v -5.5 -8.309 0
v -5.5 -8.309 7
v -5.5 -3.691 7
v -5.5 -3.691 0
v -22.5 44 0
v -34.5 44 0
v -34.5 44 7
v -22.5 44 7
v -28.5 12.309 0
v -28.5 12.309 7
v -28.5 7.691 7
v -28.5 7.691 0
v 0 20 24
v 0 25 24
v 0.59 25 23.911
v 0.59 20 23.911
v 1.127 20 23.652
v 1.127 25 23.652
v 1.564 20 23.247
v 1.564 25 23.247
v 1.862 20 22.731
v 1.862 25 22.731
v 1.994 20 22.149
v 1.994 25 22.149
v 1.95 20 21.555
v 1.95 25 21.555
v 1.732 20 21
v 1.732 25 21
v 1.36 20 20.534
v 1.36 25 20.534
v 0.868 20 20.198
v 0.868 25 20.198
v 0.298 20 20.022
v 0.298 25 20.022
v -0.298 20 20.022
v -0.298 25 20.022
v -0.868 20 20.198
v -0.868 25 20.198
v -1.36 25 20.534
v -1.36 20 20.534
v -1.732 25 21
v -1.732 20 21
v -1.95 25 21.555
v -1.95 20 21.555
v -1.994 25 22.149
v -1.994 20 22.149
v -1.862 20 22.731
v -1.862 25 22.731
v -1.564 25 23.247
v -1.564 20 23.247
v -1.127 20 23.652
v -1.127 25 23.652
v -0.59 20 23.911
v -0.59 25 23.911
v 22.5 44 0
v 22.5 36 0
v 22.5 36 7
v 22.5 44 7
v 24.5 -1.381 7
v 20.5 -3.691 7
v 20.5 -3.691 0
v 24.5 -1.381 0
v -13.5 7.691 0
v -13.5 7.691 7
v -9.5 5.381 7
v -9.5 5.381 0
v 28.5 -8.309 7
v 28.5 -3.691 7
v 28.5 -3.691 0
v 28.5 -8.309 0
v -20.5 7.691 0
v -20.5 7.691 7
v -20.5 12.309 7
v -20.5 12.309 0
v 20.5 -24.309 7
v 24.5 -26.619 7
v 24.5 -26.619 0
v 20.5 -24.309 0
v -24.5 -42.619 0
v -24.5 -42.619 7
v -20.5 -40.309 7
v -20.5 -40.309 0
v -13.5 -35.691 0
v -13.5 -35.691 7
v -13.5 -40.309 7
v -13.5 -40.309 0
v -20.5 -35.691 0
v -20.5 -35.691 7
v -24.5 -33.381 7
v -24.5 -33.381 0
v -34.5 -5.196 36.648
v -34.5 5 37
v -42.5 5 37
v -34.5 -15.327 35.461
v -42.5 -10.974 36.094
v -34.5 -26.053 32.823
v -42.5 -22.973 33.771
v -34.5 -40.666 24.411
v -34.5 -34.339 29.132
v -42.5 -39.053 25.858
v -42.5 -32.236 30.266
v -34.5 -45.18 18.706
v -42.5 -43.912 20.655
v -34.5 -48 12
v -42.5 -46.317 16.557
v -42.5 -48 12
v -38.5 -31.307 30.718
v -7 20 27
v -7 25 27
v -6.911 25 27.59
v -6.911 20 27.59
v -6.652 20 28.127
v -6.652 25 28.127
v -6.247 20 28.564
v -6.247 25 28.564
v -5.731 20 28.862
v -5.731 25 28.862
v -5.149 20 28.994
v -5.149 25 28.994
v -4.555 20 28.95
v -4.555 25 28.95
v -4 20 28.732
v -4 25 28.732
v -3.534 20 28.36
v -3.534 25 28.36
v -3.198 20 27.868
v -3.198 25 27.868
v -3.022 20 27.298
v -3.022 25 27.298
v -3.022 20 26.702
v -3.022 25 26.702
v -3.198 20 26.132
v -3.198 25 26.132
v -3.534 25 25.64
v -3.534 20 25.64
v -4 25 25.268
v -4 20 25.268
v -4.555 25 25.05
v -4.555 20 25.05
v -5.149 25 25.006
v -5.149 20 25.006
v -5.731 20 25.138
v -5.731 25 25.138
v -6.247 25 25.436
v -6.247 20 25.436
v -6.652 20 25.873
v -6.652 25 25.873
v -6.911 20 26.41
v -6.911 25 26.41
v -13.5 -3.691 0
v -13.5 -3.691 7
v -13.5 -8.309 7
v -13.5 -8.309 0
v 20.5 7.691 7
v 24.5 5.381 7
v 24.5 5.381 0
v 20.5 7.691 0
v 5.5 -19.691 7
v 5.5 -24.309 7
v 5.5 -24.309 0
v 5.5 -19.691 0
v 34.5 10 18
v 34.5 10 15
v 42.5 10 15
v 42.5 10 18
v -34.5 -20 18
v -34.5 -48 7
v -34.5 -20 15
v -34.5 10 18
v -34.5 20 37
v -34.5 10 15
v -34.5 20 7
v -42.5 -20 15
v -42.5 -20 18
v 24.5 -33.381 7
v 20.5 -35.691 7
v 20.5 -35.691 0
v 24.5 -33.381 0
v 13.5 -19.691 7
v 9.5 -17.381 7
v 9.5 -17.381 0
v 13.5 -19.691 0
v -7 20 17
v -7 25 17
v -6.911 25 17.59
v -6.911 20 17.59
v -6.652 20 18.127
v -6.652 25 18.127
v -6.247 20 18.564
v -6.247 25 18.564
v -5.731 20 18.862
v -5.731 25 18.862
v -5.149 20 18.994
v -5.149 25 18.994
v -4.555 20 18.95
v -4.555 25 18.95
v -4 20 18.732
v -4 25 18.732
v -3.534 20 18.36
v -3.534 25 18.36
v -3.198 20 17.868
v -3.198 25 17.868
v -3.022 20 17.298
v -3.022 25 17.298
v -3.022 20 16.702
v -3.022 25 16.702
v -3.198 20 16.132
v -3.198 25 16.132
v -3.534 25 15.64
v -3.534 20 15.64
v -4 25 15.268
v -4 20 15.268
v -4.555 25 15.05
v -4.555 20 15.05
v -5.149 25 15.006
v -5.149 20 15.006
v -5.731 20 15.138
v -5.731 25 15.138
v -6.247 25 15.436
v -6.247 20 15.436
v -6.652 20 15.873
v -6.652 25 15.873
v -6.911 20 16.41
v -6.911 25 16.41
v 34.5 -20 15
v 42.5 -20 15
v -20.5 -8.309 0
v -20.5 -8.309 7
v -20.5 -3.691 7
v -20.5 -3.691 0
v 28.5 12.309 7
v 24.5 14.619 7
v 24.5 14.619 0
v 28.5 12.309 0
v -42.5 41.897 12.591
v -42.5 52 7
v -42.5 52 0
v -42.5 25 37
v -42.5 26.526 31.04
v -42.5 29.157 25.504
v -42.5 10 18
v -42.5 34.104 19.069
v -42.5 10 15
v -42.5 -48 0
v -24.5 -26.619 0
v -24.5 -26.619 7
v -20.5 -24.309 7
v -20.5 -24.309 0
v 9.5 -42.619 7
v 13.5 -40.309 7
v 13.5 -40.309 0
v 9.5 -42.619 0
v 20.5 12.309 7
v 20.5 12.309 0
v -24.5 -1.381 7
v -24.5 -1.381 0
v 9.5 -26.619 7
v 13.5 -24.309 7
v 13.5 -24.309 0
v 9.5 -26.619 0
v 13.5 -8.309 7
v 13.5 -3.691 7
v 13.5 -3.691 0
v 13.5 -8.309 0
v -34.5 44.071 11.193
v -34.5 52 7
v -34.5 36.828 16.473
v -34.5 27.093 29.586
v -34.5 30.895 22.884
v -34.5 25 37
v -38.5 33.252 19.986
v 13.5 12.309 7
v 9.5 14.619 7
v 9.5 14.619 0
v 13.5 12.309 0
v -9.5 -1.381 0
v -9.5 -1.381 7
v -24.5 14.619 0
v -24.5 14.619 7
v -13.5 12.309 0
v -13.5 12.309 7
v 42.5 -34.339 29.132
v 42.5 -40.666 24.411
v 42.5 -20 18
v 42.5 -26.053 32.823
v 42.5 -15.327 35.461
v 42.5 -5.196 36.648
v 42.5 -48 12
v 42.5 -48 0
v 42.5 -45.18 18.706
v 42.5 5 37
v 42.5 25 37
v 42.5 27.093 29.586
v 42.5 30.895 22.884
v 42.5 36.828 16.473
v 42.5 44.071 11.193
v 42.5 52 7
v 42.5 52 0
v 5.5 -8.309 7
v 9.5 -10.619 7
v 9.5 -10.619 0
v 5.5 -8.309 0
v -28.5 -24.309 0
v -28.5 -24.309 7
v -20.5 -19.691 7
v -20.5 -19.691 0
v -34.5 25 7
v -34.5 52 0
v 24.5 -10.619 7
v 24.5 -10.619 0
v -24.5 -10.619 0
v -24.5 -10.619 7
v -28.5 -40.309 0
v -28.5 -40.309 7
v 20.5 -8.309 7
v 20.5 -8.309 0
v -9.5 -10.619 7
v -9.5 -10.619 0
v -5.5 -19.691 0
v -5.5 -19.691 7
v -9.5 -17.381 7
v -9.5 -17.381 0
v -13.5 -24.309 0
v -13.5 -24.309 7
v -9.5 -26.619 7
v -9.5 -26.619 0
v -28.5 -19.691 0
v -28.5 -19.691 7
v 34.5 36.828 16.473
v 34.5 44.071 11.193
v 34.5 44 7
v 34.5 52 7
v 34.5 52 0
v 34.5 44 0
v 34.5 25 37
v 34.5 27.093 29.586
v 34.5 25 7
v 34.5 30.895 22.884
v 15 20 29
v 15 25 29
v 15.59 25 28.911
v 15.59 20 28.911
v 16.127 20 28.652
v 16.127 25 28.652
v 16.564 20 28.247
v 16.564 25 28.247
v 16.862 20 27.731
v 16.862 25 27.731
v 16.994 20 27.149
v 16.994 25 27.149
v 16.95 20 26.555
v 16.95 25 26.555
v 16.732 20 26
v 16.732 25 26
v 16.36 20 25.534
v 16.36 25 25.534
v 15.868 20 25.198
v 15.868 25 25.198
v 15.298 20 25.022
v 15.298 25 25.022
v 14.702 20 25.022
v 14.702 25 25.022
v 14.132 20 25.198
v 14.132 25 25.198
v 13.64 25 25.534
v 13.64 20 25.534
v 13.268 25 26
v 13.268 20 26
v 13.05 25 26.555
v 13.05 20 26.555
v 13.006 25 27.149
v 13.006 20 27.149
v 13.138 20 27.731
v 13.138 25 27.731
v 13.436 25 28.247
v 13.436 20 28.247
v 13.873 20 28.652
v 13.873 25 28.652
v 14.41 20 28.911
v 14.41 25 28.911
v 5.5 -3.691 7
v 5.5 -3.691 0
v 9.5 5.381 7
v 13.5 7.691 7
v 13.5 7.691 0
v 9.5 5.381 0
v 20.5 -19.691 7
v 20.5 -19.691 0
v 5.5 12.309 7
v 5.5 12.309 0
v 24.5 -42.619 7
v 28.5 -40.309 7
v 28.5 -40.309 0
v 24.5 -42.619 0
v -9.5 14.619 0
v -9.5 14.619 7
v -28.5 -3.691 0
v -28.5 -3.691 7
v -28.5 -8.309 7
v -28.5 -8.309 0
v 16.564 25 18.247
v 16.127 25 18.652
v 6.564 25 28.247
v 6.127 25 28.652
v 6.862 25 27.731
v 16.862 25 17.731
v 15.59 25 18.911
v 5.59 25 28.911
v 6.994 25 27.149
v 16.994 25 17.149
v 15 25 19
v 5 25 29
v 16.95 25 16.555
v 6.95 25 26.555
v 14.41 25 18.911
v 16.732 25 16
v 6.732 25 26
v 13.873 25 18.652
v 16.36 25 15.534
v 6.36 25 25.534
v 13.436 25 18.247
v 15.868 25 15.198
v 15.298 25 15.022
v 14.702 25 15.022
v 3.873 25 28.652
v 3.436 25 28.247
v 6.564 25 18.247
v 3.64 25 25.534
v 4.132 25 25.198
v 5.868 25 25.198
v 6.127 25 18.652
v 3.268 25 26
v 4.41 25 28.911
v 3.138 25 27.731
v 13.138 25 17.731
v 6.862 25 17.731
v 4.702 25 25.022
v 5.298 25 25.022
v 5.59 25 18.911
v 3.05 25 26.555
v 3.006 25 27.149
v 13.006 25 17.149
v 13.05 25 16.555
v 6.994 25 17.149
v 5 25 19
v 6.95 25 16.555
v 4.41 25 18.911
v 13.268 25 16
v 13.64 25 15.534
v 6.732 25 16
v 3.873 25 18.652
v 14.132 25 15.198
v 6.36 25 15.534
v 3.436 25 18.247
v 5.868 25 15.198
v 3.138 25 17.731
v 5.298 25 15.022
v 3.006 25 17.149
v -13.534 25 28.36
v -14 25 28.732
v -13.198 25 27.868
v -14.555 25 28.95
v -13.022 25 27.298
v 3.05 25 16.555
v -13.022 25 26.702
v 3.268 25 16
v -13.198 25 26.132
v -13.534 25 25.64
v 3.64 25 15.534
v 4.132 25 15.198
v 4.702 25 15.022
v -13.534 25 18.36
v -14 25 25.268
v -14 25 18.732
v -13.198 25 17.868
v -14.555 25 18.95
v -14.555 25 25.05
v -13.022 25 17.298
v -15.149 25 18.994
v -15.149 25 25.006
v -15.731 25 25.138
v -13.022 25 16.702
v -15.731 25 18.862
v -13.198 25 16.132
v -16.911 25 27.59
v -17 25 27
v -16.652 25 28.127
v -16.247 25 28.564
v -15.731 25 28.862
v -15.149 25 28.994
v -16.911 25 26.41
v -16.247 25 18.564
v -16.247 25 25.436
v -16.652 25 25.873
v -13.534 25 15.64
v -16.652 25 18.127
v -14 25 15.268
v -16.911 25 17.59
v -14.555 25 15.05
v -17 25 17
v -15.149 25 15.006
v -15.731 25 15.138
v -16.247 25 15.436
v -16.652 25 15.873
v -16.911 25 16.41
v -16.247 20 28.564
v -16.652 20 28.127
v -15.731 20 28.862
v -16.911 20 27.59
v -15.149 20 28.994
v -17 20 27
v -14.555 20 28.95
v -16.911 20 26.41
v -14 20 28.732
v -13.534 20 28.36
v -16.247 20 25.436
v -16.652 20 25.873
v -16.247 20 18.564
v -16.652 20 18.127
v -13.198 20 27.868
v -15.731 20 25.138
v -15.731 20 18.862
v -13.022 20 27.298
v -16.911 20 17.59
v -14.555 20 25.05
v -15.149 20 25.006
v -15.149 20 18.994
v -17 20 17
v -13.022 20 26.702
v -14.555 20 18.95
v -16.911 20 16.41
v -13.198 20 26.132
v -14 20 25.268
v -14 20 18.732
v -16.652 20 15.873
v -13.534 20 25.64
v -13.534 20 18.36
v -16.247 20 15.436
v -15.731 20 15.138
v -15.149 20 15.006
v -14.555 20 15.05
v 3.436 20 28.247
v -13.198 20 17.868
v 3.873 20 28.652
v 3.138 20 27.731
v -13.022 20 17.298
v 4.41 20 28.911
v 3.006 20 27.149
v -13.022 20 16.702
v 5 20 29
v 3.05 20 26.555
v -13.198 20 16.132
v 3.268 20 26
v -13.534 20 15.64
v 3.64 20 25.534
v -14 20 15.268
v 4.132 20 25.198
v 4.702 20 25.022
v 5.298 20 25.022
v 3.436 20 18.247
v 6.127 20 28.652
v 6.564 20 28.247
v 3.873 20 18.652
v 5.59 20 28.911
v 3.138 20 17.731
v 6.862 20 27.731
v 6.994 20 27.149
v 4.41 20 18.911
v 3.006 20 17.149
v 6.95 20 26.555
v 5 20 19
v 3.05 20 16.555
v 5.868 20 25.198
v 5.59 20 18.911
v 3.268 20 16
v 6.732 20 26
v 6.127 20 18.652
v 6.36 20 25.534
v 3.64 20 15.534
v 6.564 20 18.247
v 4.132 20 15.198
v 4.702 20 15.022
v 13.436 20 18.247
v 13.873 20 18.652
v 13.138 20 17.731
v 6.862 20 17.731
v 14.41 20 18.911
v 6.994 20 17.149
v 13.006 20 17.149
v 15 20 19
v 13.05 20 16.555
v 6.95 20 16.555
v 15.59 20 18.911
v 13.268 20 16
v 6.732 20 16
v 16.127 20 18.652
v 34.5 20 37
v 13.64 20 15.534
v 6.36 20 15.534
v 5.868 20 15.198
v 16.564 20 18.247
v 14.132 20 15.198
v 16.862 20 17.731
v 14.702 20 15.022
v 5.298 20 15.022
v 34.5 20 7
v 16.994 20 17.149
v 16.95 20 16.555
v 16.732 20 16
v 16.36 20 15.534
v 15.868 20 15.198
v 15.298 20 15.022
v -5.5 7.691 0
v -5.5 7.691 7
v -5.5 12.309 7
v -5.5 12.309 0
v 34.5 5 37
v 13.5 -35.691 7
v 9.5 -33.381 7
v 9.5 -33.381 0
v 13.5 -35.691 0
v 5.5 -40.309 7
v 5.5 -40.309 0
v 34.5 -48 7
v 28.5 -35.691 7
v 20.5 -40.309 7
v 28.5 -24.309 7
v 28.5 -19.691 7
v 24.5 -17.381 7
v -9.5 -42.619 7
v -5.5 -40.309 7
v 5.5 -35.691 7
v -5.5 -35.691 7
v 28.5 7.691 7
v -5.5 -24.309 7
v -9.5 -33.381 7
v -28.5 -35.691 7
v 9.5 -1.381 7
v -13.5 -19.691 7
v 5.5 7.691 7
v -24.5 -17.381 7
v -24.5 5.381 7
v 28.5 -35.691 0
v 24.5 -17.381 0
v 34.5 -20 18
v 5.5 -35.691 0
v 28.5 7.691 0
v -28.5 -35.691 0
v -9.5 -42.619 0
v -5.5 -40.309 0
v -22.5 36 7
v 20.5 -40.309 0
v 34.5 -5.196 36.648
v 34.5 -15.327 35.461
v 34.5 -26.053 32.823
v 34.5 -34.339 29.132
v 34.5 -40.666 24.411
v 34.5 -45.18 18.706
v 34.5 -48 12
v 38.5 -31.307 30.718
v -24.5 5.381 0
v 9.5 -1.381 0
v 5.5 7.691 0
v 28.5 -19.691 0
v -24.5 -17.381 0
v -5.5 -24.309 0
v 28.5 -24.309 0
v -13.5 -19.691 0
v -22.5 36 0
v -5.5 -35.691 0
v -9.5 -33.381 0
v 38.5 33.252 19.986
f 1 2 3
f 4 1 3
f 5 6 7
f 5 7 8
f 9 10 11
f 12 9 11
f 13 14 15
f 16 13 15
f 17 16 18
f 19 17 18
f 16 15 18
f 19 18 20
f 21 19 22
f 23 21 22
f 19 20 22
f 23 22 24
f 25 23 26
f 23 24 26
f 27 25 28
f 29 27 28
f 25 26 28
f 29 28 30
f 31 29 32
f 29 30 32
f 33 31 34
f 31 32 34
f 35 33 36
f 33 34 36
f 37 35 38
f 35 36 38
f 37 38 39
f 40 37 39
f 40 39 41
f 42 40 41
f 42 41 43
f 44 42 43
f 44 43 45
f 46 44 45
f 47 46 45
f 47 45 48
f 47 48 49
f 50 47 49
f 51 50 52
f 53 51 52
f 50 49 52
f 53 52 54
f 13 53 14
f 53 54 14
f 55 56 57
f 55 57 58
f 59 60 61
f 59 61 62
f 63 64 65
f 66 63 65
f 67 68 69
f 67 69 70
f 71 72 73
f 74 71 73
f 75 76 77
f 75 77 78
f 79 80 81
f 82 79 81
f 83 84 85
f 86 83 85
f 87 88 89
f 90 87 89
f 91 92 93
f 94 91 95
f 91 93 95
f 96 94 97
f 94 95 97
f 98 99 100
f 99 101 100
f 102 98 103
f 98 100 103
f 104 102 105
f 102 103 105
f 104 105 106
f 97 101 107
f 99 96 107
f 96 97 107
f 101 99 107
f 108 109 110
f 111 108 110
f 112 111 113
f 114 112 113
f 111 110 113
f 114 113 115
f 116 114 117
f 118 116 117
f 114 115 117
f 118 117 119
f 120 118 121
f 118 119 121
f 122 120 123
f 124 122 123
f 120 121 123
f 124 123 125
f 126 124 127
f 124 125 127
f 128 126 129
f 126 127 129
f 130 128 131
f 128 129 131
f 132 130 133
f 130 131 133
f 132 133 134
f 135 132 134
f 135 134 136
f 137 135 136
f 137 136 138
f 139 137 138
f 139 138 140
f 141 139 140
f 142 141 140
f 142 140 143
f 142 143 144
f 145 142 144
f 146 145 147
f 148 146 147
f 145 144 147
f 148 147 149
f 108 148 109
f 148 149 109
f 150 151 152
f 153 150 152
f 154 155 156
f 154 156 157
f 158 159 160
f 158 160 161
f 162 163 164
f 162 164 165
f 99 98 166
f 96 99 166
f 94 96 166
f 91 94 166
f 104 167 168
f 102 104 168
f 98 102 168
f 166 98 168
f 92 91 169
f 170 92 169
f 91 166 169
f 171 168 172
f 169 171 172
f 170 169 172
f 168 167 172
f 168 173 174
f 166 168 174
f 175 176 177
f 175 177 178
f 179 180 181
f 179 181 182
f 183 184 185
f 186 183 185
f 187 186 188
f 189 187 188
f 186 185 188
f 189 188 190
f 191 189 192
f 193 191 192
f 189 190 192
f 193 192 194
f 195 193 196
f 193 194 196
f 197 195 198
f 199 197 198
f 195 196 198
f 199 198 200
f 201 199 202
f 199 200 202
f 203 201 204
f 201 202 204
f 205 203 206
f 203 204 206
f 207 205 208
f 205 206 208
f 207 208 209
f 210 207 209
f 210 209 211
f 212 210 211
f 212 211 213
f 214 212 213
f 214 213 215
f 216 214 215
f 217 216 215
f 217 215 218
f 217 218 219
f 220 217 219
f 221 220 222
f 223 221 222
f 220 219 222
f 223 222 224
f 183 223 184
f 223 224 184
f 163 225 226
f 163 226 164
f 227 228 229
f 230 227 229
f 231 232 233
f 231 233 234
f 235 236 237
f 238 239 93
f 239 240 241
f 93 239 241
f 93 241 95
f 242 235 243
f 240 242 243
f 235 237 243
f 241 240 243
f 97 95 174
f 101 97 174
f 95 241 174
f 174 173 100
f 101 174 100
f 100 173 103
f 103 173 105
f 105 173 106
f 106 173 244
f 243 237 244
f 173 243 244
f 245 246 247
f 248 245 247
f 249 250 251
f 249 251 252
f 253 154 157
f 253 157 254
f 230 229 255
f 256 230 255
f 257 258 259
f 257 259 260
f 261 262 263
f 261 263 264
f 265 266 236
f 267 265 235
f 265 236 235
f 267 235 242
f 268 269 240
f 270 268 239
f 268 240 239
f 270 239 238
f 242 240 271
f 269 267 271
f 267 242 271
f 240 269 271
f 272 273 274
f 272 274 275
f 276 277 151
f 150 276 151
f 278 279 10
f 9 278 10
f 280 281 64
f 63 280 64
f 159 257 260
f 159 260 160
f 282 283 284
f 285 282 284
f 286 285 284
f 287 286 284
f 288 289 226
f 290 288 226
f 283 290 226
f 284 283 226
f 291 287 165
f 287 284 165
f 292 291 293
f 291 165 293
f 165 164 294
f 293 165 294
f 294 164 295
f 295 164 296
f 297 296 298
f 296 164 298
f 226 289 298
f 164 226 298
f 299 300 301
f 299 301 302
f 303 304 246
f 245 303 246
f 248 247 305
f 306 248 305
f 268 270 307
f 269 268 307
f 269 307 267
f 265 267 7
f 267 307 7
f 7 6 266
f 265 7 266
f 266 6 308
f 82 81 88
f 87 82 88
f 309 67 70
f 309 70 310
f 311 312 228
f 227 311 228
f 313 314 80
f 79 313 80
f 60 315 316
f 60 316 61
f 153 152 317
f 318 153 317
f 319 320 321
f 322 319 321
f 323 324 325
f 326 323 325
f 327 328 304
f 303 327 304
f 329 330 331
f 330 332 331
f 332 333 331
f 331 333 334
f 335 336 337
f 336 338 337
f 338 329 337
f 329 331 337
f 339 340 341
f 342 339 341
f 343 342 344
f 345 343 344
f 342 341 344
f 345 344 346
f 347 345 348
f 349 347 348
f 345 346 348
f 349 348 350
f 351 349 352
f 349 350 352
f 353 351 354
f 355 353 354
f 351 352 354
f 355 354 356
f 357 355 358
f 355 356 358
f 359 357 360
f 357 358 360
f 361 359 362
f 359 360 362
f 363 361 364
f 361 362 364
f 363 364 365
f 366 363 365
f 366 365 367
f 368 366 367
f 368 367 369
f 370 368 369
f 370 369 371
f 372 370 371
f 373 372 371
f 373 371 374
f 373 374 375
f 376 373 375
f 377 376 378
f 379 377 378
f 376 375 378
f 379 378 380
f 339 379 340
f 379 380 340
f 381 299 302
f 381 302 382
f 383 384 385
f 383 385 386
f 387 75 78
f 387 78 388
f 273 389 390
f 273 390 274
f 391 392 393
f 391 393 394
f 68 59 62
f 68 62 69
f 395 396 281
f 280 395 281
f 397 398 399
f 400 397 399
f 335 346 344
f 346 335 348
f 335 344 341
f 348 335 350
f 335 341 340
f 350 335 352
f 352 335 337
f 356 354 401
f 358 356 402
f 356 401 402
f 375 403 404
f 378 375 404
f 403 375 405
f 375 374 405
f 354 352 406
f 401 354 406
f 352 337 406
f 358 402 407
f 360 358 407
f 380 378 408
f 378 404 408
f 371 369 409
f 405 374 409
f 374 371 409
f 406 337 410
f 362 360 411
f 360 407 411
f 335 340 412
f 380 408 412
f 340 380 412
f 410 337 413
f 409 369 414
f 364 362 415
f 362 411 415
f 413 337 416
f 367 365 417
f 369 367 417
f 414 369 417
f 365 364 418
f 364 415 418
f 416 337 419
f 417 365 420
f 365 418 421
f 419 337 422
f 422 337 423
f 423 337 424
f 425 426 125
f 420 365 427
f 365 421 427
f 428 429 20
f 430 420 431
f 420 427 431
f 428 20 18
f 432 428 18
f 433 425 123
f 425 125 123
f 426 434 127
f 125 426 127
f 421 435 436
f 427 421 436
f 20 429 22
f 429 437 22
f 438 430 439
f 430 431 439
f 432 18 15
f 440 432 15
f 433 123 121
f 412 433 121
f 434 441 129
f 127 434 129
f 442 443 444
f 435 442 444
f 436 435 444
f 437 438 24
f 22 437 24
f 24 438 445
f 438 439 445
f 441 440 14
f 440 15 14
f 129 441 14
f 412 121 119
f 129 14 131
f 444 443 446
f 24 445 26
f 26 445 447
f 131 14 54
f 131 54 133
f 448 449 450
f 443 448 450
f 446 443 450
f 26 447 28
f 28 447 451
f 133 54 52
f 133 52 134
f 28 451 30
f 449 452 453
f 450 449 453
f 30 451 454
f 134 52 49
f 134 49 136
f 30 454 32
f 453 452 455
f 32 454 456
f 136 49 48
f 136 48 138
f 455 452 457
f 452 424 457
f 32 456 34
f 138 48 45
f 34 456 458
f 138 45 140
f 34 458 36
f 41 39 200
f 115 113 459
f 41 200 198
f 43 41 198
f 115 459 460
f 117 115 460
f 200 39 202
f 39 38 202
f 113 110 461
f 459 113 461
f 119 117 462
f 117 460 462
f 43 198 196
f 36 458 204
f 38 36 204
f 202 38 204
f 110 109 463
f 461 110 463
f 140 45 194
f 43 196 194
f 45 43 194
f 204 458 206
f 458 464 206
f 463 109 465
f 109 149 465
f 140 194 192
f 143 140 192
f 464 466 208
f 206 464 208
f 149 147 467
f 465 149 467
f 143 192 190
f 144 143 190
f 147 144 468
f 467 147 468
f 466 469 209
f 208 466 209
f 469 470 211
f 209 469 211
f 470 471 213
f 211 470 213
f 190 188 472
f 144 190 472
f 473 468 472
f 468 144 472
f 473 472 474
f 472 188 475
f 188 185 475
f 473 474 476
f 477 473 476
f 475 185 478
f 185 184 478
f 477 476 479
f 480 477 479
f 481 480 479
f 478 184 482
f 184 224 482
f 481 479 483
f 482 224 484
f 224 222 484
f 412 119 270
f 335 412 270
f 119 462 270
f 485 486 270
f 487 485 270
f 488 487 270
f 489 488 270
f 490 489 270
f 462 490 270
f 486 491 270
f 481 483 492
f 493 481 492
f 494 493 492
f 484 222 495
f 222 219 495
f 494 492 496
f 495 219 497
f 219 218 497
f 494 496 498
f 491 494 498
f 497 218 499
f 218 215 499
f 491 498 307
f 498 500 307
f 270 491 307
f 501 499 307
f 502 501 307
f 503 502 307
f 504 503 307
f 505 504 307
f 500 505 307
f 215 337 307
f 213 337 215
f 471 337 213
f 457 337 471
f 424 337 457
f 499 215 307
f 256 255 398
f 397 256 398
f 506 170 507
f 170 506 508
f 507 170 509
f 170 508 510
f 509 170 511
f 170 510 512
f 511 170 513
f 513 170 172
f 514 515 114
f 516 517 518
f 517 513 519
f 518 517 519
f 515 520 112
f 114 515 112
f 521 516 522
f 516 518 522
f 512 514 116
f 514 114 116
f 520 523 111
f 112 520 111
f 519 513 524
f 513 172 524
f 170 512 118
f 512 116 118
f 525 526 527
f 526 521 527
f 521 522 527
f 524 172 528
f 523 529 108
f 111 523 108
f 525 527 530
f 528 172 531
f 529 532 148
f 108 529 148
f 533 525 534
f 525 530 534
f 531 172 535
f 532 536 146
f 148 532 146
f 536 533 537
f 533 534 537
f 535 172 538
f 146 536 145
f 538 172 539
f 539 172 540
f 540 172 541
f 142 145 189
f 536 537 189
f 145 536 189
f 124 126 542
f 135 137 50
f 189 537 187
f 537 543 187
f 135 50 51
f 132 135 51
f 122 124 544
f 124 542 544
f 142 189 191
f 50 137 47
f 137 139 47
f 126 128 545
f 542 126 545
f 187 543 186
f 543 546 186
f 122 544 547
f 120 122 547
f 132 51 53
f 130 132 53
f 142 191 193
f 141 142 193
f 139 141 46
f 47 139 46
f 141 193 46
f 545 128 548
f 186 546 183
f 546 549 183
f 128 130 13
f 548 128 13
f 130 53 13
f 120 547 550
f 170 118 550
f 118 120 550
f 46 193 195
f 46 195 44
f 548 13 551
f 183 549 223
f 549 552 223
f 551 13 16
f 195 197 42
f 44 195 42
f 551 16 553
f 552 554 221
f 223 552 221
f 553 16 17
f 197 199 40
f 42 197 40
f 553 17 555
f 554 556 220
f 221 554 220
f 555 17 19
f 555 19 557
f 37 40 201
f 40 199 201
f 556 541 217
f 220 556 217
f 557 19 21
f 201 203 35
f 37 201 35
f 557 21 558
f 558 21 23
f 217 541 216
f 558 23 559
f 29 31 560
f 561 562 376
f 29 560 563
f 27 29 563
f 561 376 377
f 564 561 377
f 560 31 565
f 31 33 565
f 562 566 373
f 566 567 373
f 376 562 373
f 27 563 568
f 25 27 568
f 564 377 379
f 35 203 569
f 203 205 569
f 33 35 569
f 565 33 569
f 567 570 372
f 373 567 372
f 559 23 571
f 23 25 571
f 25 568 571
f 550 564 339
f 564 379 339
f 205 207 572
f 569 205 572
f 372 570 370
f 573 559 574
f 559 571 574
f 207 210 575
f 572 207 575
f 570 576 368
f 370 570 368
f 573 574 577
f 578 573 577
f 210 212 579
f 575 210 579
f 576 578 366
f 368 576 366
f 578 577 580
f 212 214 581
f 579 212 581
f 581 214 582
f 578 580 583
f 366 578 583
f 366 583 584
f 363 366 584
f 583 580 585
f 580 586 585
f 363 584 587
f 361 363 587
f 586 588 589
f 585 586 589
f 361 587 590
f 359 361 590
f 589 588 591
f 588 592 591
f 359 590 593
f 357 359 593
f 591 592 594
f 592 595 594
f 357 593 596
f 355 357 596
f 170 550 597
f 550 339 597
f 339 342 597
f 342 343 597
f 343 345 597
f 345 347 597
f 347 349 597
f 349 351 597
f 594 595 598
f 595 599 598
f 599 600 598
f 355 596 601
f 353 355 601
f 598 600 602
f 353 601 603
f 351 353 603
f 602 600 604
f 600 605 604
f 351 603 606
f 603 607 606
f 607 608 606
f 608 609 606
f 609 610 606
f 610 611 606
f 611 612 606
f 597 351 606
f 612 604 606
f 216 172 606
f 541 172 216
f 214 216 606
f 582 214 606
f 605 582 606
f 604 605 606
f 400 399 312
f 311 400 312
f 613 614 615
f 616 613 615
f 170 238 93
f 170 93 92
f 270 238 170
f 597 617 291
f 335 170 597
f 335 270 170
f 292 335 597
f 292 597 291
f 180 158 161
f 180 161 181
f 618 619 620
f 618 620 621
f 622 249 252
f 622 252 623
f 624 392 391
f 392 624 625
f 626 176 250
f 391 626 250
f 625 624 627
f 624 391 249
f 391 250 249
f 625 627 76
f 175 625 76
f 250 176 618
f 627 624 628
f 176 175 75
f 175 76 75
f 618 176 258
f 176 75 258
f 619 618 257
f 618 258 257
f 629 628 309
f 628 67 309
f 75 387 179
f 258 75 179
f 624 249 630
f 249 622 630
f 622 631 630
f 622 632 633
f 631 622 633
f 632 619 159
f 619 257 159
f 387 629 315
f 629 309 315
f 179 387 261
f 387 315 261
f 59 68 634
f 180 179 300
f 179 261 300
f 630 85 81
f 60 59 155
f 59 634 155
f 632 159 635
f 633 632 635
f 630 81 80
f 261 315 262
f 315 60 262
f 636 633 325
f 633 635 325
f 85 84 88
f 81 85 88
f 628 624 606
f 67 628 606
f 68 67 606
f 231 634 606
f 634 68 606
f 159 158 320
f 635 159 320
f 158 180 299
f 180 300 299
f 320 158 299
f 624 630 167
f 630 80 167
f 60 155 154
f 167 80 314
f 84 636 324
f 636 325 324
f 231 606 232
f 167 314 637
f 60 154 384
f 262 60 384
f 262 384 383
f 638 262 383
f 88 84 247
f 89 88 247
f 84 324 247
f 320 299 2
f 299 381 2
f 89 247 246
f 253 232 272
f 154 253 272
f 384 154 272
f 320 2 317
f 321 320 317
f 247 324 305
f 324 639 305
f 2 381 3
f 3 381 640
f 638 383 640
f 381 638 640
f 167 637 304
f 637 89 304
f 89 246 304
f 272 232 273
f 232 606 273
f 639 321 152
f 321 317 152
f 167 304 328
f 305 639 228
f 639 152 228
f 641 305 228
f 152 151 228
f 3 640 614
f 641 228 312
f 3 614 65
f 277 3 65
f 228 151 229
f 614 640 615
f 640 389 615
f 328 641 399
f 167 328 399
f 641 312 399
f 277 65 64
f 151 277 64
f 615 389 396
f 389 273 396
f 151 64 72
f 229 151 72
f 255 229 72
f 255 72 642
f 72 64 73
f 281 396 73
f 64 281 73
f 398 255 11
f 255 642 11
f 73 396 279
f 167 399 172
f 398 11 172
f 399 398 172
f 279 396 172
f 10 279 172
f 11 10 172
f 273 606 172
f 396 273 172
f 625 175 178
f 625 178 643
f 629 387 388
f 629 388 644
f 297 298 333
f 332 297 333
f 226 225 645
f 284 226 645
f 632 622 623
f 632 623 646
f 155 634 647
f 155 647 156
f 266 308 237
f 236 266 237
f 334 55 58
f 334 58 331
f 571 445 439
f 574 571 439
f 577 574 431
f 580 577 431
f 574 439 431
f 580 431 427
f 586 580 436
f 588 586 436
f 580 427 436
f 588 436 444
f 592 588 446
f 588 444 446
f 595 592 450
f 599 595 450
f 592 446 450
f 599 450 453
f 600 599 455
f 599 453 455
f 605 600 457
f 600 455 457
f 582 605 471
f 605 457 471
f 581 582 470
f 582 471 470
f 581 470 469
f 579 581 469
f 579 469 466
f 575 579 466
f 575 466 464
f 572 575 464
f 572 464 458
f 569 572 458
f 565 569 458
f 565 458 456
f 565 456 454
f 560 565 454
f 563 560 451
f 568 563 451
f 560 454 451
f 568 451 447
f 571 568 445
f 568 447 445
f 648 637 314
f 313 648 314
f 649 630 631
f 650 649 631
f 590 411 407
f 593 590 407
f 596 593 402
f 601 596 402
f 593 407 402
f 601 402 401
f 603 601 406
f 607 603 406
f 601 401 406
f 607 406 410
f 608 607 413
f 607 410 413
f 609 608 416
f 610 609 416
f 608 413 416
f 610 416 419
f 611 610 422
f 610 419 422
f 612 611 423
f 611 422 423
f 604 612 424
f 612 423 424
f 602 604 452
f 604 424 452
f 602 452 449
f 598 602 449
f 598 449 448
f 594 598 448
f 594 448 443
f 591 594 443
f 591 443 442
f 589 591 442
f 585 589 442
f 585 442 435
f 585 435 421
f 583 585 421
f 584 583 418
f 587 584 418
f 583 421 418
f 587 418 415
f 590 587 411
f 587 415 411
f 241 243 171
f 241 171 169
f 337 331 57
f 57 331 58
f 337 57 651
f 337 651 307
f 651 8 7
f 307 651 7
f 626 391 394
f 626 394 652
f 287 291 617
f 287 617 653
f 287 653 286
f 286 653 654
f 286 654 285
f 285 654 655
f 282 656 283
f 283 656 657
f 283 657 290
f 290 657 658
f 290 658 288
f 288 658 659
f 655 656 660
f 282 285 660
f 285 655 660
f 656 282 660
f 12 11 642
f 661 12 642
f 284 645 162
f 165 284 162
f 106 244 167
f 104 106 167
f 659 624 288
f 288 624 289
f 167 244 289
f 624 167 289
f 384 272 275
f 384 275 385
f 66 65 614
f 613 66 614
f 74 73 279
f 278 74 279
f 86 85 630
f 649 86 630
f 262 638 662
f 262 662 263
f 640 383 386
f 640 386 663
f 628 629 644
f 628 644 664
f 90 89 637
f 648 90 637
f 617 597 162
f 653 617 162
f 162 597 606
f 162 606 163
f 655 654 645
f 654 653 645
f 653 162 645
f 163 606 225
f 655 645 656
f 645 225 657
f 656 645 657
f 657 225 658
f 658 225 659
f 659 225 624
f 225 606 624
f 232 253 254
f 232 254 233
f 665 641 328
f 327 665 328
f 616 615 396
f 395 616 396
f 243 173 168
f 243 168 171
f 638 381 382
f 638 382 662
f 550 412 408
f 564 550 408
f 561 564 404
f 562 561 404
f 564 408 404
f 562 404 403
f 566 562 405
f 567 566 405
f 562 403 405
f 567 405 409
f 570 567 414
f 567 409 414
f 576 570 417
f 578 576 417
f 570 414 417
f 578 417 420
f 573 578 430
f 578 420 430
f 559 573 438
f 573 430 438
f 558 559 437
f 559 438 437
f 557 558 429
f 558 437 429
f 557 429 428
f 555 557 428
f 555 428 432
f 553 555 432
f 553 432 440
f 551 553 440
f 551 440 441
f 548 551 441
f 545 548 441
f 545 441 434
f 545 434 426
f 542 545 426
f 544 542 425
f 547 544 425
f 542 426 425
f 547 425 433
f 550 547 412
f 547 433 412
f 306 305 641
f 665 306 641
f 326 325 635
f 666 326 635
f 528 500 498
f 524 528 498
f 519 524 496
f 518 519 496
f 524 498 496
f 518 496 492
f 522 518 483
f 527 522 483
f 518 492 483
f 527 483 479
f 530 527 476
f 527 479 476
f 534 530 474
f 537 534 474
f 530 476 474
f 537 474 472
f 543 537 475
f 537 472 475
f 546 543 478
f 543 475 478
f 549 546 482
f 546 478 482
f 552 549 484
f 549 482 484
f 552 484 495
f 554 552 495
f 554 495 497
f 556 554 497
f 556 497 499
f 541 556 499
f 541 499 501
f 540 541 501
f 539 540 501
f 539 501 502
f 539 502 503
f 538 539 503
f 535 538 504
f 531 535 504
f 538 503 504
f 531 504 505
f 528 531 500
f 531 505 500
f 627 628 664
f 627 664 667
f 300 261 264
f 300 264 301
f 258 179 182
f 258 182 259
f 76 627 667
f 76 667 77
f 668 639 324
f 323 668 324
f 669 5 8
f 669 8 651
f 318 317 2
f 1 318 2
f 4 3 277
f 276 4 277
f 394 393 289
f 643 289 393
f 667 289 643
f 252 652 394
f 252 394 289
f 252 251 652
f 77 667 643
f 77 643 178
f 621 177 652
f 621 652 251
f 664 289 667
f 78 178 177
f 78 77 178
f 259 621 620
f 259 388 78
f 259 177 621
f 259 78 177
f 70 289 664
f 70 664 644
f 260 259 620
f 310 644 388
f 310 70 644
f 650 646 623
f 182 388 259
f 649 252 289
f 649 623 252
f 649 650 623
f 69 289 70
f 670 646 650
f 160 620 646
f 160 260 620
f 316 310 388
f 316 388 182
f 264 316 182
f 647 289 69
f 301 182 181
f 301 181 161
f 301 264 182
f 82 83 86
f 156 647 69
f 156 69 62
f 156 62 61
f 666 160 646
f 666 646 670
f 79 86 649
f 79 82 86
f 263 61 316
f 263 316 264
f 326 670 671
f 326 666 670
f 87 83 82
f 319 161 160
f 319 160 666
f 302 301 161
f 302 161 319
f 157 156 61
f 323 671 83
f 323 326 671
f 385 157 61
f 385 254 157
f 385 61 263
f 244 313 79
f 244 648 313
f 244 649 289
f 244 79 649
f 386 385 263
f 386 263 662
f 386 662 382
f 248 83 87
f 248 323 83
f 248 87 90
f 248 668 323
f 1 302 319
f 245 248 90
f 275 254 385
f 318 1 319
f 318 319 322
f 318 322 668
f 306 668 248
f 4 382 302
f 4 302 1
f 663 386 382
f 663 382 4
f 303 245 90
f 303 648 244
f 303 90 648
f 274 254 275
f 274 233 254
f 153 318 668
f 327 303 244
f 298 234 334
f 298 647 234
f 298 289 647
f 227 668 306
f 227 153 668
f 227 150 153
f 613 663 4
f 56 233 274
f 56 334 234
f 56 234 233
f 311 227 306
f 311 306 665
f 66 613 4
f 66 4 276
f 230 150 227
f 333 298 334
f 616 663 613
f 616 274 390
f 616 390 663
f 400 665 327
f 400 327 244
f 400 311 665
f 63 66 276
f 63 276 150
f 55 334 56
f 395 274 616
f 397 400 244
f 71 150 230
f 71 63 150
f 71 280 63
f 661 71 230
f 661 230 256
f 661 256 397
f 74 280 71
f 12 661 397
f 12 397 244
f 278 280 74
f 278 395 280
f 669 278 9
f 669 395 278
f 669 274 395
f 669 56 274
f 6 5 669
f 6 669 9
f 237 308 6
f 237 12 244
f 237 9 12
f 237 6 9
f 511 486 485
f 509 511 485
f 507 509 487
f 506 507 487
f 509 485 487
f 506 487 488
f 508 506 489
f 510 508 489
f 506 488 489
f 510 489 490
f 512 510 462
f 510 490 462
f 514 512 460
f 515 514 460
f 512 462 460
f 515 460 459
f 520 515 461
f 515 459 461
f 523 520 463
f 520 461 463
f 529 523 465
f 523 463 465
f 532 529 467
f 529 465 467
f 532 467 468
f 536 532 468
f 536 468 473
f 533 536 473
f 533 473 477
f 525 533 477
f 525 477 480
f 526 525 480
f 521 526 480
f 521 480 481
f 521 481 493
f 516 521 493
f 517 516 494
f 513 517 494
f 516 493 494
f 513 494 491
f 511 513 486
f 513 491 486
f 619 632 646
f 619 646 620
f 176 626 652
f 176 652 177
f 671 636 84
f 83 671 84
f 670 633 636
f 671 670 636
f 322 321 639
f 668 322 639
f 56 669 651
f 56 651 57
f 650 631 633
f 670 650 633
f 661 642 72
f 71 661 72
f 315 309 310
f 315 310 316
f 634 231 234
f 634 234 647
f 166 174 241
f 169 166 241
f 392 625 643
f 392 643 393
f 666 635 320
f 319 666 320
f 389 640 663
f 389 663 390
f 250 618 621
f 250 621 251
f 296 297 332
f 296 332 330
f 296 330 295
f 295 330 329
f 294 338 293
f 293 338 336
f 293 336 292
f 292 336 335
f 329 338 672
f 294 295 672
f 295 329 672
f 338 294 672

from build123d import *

# Parameters (mm, degrees)
SALIENTE_EXTRUIR1_DEPTH = 7
SALIENTE_EXTRUIR2_DEPTH = 30
CORTAR_EXTRUIR3_REACH   = 108.292
CROQUIS3_W              = 3
CROQUIS3_H              = 30
CORTAR_EXTRUIR4_DEPTH   = 7
CROQUIS5_R              = 2
CORTAR_EXTRUIR5_DEPTH   = 5


with BuildPart() as part:
    # Croquis1 → Saliente-Extruir1 (new body)
    with BuildSketch(Plane.XY):
        Polygon((-42.5, 52), (-34.5, 52), (-34.5, 44), (-22.5, 44), (-22.5, 36), (22.5, 36), (22.5, 44), (34.5, 44), (34.5, 52), (42.5, 52), (42.5, -48), (-42.5, -48), align=None)
    extrude(amount=SALIENTE_EXTRUIR1_DEPTH)

    # Croquis2 → Saliente-Extruir2 (add)
    with BuildSketch(Plane.XY.offset(7)):
        Polygon((-42.5, 52), (-42.5, -48), (-34.5, -48), (-34.5, 20), (34.5, 20), (34.5, -48), (42.5, -48), (42.5, 52), (34.5, 52), (34.5, 25), (-34.5, 25), (-34.5, 52), align=None)
    extrude(amount=SALIENTE_EXTRUIR2_DEPTH)

    # Cortar-Extruir3: up to this face of the body (flat: up to its plane)
    cortar_extruir3_end = Plane(part.part.faces().sort_by_distance((42.5, 2, 18.5))[0])
    # Croquis3 → Cortar-Extruir3 (cut, up to the picked face)
    with BuildSketch(Plane.ZY.offset(42.5), mode=Mode.PRIVATE) as cortar_extruir3_sk1:
        with BuildLine():
            Line((37, 52), (7, 52))
            add(Edge.make_bspline(
                [(7, 52), (17.9721482, 28.003586462), (37, 25)],
                knots=[0, 0, 0, 0.777512114, 0.777512114, 0.777512114], degree=2))
            Line((37, 25), (37, 52))
        make_face()
    cortar_extruir3_tool1 = split(extrude(cortar_extruir3_sk1.sketch, amount=-CORTAR_EXTRUIR3_REACH, mode=Mode.PRIVATE), bisect_by=cortar_extruir3_end, keep=Keep.BOTH, mode=Mode.PRIVATE)
    # Croquis3 → Cortar-Extruir3 (cut, up to the picked face)
    with BuildSketch(Plane.ZY.offset(42.5), mode=Mode.PRIVATE) as cortar_extruir3_sk2:
        with BuildLine():
            Line((37, -48), (37, 5))
            add(Edge.make_bspline(
                [(37, 5), (36.935096366, -41.11468491), (12, -48)],
                knots=[0, 0, 0, 0.740176789, 0.740176789, 0.740176789], degree=2))
            Line((12, -48), (37, -48))
        make_face()
    cortar_extruir3_tool2 = split(extrude(cortar_extruir3_sk2.sketch, amount=-CORTAR_EXTRUIR3_REACH, mode=Mode.PRIVATE), bisect_by=cortar_extruir3_end, keep=Keep.BOTH, mode=Mode.PRIVATE)
    # Croquis3 → Cortar-Extruir3 (cut, up to the picked face)
    with BuildSketch(Plane.ZY.offset(42.5), mode=Mode.PRIVATE) as cortar_extruir3_sk3:
        with Locations((16.5, -5)):
            Rectangle(CROQUIS3_W, CROQUIS3_H)
    cortar_extruir3_tool3 = split(extrude(cortar_extruir3_sk3.sketch, amount=-CORTAR_EXTRUIR3_REACH, mode=Mode.PRIVATE), bisect_by=cortar_extruir3_end, keep=Keep.BOTH, mode=Mode.PRIVATE)
    add(cortar_extruir3_tool1.solids().sort_by(Axis((-42.5, 41.293865, 25.499066), (1, 0, 0)))[0], mode=Mode.SUBTRACT)
    add(cortar_extruir3_tool2.solids().sort_by(Axis((-42.5, -37.068003, 30.970324), (1, 0, 0)))[0], mode=Mode.SUBTRACT)
    add(cortar_extruir3_tool3.solids().sort_by(Axis((-42.5, -5, 16.5), (1, 0, 0)))[0], mode=Mode.SUBTRACT)

    # Croquis4 → Cortar-Extruir4 (cut)
    with BuildSketch(Plane.XY.offset(7)):
        Polygon((-13.5, 12.309401077), (-13.5, 7.690598923), (-9.5, 5.381197846), (-5.5, 7.690598923), (-5.5, 12.309401077), (-9.5, 14.618802154), align=None)
        Polygon((-24.5, -10.618802154), (-20.5, -8.309401077), (-20.5, -3.690598923), (-24.5, -1.381197846), (-28.5, -3.690598923), (-28.5, -8.309401077), align=None)
        Polygon((-24.5, 5.381197846), (-20.5, 7.690598923), (-20.5, 12.309401077), (-24.5, 14.618802154), (-28.5, 12.309401077), (-28.5, 7.690598923), align=None)
        Polygon((-24.5, -26.618802154), (-20.5, -24.309401077), (-20.5, -19.690598923), (-24.5, -17.381197846), (-28.5, -19.690598923), (-28.5, -24.309401077), align=None)
        Polygon((-24.5, -42.618802154), (-20.5, -40.309401077), (-20.5, -35.690598923), (-24.5, -33.381197846), (-28.5, -35.690598923), (-28.5, -40.309401077), align=None)
        Polygon((-9.5, -10.618802154), (-5.5, -8.309401077), (-5.5, -3.690598923), (-9.5, -1.381197846), (-13.5, -3.690598923), (-13.5, -8.309401077), align=None)
        Polygon((-9.5, -26.618802154), (-5.5, -24.309401077), (-5.5, -19.690598923), (-9.5, -17.381197846), (-13.5, -19.690598923), (-13.5, -24.309401077), align=None)
        Polygon((-9.5, -42.618802154), (-5.5, -40.309401077), (-5.5, -35.690598923), (-9.5, -33.381197846), (-13.5, -35.690598923), (-13.5, -40.309401077), align=None)
        Polygon((13.5, -40.309401077), (9.5, -42.618802154), (5.5, -40.309401077), (5.5, -35.690598923), (9.5, -33.381197846), (13.5, -35.690598923), align=None)
        Polygon((28.5, -40.309401077), (24.5, -42.618802154), (20.5, -40.309401077), (20.5, -35.690598923), (24.5, -33.381197846), (28.5, -35.690598923), align=None)
        Polygon((28.5, -24.309401077), (24.5, -26.618802154), (20.5, -24.309401077), (20.5, -19.690598923), (24.5, -17.381197846), (28.5, -19.690598923), align=None)
        Polygon((13.5, -24.309401077), (9.5, -26.618802154), (5.5, -24.309401077), (5.5, -19.690598923), (9.5, -17.381197846), (13.5, -19.690598923), align=None)
        Polygon((13.5, -8.309401077), (9.5, -10.618802154), (5.5, -8.309401077), (5.5, -3.690598923), (9.5, -1.381197846), (13.5, -3.690598923), align=None)
        Polygon((28.5, -8.309401077), (24.5, -10.618802154), (20.5, -8.309401077), (20.5, -3.690598923), (24.5, -1.381197846), (28.5, -3.690598923), align=None)
        Polygon((28.5, 7.690598923), (24.5, 5.381197846), (20.5, 7.690598923), (20.5, 12.309401077), (24.5, 14.618802154), (28.5, 12.309401077), align=None)
        Polygon((9.5, 14.618802154), (13.5, 12.309401077), (13.5, 7.690598923), (9.5, 5.381197846), (5.5, 7.690598923), (5.5, 12.309401077), align=None)
    extrude(amount=-CORTAR_EXTRUIR4_DEPTH, mode=Mode.SUBTRACT)

    # Croquis5 → Cortar-Extruir5 (cut)
    with BuildSketch(Plane(origin=(0, 25, 0), x_dir=(1, 0, 0), z_dir=(0, 1, 0))):
        with Locations(Location((0, -22, 0), (0, 0, 270))):
            Circle(CROQUIS5_R)
        with Locations(Location((5, -17, 0), (0, 0, 270))):
            Circle(CROQUIS5_R)
        with Locations(Location((5, -27, 0), (0, 0, 270))):
            Circle(CROQUIS5_R)
        with Locations(Location((-5, -27, 0), (0, 0, 180))):
            Circle(CROQUIS5_R)
        with Locations(Location((-5, -17, 0), (0, 0, 180))):
            Circle(CROQUIS5_R)
        with Locations(Location((15, -17, 0), (0, 0, 270))):
            Circle(CROQUIS5_R)
        with Locations(Location((15, -27, 0), (0, 0, 270))):
            Circle(CROQUIS5_R)
        with Locations(Location((-15, -17, 0), (0, 0, 180))):
            Circle(CROQUIS5_R)
        with Locations(Location((-15, -27, 0), (0, 0, 180))):
            Circle(CROQUIS5_R)
    extrude(amount=-CORTAR_EXTRUIR5_DEPTH, mode=Mode.SUBTRACT)


solid = part.part
